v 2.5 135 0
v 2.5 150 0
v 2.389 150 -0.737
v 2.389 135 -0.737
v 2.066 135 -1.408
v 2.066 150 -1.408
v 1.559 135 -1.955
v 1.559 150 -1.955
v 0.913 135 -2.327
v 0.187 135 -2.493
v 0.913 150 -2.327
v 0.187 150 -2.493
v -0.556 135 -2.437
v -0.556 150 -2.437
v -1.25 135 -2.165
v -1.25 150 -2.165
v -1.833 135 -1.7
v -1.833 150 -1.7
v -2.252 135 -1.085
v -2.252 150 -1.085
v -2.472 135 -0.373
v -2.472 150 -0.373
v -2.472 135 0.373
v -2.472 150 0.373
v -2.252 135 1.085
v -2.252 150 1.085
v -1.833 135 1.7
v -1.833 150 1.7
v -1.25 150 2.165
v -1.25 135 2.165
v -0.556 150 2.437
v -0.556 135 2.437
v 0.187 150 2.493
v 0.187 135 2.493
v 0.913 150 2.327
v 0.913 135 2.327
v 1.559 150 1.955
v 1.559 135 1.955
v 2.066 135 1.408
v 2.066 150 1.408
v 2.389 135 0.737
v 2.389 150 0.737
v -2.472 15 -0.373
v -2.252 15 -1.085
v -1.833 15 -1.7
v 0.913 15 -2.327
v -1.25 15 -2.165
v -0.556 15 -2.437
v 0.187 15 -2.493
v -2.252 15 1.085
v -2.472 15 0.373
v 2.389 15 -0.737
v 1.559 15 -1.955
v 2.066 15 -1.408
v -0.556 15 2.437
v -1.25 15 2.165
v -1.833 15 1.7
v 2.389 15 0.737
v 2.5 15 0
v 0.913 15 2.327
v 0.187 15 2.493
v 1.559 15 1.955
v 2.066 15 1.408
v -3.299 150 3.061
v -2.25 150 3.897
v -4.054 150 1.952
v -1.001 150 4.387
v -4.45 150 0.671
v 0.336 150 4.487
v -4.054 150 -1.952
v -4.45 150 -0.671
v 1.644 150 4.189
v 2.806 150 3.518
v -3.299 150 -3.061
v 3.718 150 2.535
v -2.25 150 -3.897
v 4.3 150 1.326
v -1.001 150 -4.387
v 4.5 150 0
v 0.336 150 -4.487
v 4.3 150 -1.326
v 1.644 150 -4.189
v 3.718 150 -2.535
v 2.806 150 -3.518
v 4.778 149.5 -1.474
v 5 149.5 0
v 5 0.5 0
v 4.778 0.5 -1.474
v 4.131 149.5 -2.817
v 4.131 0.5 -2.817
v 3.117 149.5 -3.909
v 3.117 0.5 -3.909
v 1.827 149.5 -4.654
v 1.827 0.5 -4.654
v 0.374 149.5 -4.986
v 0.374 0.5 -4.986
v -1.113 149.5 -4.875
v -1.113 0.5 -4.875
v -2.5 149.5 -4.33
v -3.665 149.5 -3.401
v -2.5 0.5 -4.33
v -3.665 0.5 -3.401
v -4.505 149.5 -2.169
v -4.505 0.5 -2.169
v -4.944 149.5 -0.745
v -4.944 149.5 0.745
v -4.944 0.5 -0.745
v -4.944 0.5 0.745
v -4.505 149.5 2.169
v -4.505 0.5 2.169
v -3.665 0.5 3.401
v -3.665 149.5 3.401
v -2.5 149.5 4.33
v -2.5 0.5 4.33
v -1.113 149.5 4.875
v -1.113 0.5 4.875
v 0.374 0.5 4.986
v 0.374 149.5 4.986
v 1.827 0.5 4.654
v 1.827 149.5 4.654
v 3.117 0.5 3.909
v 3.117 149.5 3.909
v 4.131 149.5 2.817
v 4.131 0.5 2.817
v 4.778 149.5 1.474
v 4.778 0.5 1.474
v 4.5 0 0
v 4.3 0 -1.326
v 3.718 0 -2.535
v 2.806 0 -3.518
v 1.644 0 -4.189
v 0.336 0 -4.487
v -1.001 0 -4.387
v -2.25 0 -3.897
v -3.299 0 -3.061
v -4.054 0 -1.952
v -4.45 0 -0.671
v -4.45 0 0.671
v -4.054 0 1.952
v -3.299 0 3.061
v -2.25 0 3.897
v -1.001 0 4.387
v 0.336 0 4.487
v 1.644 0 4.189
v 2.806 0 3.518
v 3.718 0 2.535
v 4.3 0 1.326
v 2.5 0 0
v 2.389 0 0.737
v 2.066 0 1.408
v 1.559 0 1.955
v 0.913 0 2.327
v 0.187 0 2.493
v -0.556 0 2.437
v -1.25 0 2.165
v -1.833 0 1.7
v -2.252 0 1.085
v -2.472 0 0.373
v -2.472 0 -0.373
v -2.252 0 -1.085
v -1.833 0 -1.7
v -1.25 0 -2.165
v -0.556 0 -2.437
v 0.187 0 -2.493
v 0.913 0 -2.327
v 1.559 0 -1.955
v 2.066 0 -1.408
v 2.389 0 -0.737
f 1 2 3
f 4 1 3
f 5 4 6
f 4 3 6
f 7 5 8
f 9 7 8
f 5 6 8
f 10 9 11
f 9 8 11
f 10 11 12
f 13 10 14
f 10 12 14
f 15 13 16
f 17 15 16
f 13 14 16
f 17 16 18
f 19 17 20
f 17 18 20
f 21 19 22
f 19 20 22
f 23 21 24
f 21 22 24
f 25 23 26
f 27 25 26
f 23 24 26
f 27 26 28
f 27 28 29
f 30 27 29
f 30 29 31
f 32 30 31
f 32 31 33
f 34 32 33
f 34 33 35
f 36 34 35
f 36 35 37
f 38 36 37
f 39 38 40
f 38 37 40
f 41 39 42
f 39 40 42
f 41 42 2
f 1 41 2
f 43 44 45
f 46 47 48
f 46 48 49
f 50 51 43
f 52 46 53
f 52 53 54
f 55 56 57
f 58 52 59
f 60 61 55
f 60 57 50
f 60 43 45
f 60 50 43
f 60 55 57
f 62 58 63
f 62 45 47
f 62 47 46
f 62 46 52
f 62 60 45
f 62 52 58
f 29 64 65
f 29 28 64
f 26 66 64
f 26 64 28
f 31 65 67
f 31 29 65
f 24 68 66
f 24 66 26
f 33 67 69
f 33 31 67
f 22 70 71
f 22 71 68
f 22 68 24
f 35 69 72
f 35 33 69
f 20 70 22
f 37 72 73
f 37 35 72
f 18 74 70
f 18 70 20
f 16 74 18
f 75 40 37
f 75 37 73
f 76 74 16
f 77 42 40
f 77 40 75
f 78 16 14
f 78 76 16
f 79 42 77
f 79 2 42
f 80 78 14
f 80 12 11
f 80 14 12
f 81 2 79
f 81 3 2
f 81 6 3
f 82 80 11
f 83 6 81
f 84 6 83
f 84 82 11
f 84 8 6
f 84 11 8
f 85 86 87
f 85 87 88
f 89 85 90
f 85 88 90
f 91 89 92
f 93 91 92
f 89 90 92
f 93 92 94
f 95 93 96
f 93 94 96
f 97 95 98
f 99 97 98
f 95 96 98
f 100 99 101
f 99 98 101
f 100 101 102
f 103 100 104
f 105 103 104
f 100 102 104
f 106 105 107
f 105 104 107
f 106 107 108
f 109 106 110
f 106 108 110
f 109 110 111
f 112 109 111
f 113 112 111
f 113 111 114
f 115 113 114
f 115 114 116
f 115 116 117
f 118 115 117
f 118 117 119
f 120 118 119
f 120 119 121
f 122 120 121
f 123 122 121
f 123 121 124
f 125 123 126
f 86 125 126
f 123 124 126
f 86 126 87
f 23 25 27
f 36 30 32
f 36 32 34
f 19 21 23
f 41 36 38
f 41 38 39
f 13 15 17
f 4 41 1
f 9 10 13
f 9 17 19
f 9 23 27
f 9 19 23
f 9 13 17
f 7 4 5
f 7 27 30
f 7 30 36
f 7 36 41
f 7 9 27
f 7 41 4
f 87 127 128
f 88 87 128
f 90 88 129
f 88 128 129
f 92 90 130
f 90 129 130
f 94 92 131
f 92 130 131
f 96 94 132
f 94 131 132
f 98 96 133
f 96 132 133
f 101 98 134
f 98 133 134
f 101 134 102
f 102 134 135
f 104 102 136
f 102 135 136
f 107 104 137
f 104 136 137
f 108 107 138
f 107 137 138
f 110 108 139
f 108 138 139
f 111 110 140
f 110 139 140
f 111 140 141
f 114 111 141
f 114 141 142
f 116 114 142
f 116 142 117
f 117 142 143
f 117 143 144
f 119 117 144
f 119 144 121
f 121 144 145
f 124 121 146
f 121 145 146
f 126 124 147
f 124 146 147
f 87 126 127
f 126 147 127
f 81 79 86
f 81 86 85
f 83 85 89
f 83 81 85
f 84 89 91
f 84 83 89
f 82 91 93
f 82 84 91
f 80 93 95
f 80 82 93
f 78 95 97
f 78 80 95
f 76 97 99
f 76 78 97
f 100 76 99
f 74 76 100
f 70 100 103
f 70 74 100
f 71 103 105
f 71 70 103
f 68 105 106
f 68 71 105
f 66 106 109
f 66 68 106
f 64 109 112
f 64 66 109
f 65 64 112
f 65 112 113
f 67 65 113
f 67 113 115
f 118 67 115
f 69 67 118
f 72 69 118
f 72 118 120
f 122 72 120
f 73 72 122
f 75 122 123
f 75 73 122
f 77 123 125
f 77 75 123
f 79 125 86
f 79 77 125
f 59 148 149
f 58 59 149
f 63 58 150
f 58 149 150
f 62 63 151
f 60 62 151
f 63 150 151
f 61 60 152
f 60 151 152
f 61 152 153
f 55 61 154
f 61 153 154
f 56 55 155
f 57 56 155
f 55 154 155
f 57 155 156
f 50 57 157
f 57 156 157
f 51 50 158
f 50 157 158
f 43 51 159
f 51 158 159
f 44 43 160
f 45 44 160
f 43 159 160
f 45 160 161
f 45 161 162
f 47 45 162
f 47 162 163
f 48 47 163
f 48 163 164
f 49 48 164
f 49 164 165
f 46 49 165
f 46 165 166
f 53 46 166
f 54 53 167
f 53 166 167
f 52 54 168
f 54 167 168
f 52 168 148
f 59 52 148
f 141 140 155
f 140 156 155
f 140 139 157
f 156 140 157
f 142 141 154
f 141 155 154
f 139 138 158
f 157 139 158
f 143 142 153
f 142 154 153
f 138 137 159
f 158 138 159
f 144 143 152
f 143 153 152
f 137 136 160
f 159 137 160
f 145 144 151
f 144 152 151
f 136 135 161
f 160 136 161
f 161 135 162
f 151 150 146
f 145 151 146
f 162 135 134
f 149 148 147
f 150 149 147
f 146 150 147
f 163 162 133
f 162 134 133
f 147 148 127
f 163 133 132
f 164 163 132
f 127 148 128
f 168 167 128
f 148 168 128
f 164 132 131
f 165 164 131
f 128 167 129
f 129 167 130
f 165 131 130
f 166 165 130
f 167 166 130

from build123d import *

# Parameters (mm, degrees)
ESQUISSE1_R      = 5
EXTRUSION1_DEPTH = 150
CHANFREIN1_SIZE  = 0.5
ESQUISSE2_R      = 2.5
EXTRUSION2_DEPTH = 15
ESQUISSE3_R      = 2.5
EXTRUSION3_DEPTH = 15


with BuildPart() as part:
    # Esquisse1 → Extrusion1 (new body)
    with BuildSketch(Plane(origin=(0, 0, 0), x_dir=(1, 0, 0), z_dir=(0, 1, 0))):
        Circle(ESQUISSE1_R)
    extrude(amount=EXTRUSION1_DEPTH)

    # Chanfrein1
    chanfrein1_edges = [part.edges().sort_by_distance(p)[0] for p in [
        (-5, 0, 0),
        (-5, 150, 0),
    ]]
    chamfer(chanfrein1_edges, length=CHANFREIN1_SIZE)

    # Esquisse2 → Extrusion2 (cut)
    with BuildSketch(Plane.XZ):
        Circle(ESQUISSE2_R)
    extrude(amount=-EXTRUSION2_DEPTH, mode=Mode.SUBTRACT)

    # Esquisse3 → Extrusion3 (cut)
    with BuildSketch(Plane(origin=(0, 150, 0), x_dir=(1, 0, 0), z_dir=(0, 1, 0))):
        Circle(ESQUISSE3_R)
    extrude(amount=-EXTRUSION3_DEPTH, mode=Mode.SUBTRACT)


solid = part.part
